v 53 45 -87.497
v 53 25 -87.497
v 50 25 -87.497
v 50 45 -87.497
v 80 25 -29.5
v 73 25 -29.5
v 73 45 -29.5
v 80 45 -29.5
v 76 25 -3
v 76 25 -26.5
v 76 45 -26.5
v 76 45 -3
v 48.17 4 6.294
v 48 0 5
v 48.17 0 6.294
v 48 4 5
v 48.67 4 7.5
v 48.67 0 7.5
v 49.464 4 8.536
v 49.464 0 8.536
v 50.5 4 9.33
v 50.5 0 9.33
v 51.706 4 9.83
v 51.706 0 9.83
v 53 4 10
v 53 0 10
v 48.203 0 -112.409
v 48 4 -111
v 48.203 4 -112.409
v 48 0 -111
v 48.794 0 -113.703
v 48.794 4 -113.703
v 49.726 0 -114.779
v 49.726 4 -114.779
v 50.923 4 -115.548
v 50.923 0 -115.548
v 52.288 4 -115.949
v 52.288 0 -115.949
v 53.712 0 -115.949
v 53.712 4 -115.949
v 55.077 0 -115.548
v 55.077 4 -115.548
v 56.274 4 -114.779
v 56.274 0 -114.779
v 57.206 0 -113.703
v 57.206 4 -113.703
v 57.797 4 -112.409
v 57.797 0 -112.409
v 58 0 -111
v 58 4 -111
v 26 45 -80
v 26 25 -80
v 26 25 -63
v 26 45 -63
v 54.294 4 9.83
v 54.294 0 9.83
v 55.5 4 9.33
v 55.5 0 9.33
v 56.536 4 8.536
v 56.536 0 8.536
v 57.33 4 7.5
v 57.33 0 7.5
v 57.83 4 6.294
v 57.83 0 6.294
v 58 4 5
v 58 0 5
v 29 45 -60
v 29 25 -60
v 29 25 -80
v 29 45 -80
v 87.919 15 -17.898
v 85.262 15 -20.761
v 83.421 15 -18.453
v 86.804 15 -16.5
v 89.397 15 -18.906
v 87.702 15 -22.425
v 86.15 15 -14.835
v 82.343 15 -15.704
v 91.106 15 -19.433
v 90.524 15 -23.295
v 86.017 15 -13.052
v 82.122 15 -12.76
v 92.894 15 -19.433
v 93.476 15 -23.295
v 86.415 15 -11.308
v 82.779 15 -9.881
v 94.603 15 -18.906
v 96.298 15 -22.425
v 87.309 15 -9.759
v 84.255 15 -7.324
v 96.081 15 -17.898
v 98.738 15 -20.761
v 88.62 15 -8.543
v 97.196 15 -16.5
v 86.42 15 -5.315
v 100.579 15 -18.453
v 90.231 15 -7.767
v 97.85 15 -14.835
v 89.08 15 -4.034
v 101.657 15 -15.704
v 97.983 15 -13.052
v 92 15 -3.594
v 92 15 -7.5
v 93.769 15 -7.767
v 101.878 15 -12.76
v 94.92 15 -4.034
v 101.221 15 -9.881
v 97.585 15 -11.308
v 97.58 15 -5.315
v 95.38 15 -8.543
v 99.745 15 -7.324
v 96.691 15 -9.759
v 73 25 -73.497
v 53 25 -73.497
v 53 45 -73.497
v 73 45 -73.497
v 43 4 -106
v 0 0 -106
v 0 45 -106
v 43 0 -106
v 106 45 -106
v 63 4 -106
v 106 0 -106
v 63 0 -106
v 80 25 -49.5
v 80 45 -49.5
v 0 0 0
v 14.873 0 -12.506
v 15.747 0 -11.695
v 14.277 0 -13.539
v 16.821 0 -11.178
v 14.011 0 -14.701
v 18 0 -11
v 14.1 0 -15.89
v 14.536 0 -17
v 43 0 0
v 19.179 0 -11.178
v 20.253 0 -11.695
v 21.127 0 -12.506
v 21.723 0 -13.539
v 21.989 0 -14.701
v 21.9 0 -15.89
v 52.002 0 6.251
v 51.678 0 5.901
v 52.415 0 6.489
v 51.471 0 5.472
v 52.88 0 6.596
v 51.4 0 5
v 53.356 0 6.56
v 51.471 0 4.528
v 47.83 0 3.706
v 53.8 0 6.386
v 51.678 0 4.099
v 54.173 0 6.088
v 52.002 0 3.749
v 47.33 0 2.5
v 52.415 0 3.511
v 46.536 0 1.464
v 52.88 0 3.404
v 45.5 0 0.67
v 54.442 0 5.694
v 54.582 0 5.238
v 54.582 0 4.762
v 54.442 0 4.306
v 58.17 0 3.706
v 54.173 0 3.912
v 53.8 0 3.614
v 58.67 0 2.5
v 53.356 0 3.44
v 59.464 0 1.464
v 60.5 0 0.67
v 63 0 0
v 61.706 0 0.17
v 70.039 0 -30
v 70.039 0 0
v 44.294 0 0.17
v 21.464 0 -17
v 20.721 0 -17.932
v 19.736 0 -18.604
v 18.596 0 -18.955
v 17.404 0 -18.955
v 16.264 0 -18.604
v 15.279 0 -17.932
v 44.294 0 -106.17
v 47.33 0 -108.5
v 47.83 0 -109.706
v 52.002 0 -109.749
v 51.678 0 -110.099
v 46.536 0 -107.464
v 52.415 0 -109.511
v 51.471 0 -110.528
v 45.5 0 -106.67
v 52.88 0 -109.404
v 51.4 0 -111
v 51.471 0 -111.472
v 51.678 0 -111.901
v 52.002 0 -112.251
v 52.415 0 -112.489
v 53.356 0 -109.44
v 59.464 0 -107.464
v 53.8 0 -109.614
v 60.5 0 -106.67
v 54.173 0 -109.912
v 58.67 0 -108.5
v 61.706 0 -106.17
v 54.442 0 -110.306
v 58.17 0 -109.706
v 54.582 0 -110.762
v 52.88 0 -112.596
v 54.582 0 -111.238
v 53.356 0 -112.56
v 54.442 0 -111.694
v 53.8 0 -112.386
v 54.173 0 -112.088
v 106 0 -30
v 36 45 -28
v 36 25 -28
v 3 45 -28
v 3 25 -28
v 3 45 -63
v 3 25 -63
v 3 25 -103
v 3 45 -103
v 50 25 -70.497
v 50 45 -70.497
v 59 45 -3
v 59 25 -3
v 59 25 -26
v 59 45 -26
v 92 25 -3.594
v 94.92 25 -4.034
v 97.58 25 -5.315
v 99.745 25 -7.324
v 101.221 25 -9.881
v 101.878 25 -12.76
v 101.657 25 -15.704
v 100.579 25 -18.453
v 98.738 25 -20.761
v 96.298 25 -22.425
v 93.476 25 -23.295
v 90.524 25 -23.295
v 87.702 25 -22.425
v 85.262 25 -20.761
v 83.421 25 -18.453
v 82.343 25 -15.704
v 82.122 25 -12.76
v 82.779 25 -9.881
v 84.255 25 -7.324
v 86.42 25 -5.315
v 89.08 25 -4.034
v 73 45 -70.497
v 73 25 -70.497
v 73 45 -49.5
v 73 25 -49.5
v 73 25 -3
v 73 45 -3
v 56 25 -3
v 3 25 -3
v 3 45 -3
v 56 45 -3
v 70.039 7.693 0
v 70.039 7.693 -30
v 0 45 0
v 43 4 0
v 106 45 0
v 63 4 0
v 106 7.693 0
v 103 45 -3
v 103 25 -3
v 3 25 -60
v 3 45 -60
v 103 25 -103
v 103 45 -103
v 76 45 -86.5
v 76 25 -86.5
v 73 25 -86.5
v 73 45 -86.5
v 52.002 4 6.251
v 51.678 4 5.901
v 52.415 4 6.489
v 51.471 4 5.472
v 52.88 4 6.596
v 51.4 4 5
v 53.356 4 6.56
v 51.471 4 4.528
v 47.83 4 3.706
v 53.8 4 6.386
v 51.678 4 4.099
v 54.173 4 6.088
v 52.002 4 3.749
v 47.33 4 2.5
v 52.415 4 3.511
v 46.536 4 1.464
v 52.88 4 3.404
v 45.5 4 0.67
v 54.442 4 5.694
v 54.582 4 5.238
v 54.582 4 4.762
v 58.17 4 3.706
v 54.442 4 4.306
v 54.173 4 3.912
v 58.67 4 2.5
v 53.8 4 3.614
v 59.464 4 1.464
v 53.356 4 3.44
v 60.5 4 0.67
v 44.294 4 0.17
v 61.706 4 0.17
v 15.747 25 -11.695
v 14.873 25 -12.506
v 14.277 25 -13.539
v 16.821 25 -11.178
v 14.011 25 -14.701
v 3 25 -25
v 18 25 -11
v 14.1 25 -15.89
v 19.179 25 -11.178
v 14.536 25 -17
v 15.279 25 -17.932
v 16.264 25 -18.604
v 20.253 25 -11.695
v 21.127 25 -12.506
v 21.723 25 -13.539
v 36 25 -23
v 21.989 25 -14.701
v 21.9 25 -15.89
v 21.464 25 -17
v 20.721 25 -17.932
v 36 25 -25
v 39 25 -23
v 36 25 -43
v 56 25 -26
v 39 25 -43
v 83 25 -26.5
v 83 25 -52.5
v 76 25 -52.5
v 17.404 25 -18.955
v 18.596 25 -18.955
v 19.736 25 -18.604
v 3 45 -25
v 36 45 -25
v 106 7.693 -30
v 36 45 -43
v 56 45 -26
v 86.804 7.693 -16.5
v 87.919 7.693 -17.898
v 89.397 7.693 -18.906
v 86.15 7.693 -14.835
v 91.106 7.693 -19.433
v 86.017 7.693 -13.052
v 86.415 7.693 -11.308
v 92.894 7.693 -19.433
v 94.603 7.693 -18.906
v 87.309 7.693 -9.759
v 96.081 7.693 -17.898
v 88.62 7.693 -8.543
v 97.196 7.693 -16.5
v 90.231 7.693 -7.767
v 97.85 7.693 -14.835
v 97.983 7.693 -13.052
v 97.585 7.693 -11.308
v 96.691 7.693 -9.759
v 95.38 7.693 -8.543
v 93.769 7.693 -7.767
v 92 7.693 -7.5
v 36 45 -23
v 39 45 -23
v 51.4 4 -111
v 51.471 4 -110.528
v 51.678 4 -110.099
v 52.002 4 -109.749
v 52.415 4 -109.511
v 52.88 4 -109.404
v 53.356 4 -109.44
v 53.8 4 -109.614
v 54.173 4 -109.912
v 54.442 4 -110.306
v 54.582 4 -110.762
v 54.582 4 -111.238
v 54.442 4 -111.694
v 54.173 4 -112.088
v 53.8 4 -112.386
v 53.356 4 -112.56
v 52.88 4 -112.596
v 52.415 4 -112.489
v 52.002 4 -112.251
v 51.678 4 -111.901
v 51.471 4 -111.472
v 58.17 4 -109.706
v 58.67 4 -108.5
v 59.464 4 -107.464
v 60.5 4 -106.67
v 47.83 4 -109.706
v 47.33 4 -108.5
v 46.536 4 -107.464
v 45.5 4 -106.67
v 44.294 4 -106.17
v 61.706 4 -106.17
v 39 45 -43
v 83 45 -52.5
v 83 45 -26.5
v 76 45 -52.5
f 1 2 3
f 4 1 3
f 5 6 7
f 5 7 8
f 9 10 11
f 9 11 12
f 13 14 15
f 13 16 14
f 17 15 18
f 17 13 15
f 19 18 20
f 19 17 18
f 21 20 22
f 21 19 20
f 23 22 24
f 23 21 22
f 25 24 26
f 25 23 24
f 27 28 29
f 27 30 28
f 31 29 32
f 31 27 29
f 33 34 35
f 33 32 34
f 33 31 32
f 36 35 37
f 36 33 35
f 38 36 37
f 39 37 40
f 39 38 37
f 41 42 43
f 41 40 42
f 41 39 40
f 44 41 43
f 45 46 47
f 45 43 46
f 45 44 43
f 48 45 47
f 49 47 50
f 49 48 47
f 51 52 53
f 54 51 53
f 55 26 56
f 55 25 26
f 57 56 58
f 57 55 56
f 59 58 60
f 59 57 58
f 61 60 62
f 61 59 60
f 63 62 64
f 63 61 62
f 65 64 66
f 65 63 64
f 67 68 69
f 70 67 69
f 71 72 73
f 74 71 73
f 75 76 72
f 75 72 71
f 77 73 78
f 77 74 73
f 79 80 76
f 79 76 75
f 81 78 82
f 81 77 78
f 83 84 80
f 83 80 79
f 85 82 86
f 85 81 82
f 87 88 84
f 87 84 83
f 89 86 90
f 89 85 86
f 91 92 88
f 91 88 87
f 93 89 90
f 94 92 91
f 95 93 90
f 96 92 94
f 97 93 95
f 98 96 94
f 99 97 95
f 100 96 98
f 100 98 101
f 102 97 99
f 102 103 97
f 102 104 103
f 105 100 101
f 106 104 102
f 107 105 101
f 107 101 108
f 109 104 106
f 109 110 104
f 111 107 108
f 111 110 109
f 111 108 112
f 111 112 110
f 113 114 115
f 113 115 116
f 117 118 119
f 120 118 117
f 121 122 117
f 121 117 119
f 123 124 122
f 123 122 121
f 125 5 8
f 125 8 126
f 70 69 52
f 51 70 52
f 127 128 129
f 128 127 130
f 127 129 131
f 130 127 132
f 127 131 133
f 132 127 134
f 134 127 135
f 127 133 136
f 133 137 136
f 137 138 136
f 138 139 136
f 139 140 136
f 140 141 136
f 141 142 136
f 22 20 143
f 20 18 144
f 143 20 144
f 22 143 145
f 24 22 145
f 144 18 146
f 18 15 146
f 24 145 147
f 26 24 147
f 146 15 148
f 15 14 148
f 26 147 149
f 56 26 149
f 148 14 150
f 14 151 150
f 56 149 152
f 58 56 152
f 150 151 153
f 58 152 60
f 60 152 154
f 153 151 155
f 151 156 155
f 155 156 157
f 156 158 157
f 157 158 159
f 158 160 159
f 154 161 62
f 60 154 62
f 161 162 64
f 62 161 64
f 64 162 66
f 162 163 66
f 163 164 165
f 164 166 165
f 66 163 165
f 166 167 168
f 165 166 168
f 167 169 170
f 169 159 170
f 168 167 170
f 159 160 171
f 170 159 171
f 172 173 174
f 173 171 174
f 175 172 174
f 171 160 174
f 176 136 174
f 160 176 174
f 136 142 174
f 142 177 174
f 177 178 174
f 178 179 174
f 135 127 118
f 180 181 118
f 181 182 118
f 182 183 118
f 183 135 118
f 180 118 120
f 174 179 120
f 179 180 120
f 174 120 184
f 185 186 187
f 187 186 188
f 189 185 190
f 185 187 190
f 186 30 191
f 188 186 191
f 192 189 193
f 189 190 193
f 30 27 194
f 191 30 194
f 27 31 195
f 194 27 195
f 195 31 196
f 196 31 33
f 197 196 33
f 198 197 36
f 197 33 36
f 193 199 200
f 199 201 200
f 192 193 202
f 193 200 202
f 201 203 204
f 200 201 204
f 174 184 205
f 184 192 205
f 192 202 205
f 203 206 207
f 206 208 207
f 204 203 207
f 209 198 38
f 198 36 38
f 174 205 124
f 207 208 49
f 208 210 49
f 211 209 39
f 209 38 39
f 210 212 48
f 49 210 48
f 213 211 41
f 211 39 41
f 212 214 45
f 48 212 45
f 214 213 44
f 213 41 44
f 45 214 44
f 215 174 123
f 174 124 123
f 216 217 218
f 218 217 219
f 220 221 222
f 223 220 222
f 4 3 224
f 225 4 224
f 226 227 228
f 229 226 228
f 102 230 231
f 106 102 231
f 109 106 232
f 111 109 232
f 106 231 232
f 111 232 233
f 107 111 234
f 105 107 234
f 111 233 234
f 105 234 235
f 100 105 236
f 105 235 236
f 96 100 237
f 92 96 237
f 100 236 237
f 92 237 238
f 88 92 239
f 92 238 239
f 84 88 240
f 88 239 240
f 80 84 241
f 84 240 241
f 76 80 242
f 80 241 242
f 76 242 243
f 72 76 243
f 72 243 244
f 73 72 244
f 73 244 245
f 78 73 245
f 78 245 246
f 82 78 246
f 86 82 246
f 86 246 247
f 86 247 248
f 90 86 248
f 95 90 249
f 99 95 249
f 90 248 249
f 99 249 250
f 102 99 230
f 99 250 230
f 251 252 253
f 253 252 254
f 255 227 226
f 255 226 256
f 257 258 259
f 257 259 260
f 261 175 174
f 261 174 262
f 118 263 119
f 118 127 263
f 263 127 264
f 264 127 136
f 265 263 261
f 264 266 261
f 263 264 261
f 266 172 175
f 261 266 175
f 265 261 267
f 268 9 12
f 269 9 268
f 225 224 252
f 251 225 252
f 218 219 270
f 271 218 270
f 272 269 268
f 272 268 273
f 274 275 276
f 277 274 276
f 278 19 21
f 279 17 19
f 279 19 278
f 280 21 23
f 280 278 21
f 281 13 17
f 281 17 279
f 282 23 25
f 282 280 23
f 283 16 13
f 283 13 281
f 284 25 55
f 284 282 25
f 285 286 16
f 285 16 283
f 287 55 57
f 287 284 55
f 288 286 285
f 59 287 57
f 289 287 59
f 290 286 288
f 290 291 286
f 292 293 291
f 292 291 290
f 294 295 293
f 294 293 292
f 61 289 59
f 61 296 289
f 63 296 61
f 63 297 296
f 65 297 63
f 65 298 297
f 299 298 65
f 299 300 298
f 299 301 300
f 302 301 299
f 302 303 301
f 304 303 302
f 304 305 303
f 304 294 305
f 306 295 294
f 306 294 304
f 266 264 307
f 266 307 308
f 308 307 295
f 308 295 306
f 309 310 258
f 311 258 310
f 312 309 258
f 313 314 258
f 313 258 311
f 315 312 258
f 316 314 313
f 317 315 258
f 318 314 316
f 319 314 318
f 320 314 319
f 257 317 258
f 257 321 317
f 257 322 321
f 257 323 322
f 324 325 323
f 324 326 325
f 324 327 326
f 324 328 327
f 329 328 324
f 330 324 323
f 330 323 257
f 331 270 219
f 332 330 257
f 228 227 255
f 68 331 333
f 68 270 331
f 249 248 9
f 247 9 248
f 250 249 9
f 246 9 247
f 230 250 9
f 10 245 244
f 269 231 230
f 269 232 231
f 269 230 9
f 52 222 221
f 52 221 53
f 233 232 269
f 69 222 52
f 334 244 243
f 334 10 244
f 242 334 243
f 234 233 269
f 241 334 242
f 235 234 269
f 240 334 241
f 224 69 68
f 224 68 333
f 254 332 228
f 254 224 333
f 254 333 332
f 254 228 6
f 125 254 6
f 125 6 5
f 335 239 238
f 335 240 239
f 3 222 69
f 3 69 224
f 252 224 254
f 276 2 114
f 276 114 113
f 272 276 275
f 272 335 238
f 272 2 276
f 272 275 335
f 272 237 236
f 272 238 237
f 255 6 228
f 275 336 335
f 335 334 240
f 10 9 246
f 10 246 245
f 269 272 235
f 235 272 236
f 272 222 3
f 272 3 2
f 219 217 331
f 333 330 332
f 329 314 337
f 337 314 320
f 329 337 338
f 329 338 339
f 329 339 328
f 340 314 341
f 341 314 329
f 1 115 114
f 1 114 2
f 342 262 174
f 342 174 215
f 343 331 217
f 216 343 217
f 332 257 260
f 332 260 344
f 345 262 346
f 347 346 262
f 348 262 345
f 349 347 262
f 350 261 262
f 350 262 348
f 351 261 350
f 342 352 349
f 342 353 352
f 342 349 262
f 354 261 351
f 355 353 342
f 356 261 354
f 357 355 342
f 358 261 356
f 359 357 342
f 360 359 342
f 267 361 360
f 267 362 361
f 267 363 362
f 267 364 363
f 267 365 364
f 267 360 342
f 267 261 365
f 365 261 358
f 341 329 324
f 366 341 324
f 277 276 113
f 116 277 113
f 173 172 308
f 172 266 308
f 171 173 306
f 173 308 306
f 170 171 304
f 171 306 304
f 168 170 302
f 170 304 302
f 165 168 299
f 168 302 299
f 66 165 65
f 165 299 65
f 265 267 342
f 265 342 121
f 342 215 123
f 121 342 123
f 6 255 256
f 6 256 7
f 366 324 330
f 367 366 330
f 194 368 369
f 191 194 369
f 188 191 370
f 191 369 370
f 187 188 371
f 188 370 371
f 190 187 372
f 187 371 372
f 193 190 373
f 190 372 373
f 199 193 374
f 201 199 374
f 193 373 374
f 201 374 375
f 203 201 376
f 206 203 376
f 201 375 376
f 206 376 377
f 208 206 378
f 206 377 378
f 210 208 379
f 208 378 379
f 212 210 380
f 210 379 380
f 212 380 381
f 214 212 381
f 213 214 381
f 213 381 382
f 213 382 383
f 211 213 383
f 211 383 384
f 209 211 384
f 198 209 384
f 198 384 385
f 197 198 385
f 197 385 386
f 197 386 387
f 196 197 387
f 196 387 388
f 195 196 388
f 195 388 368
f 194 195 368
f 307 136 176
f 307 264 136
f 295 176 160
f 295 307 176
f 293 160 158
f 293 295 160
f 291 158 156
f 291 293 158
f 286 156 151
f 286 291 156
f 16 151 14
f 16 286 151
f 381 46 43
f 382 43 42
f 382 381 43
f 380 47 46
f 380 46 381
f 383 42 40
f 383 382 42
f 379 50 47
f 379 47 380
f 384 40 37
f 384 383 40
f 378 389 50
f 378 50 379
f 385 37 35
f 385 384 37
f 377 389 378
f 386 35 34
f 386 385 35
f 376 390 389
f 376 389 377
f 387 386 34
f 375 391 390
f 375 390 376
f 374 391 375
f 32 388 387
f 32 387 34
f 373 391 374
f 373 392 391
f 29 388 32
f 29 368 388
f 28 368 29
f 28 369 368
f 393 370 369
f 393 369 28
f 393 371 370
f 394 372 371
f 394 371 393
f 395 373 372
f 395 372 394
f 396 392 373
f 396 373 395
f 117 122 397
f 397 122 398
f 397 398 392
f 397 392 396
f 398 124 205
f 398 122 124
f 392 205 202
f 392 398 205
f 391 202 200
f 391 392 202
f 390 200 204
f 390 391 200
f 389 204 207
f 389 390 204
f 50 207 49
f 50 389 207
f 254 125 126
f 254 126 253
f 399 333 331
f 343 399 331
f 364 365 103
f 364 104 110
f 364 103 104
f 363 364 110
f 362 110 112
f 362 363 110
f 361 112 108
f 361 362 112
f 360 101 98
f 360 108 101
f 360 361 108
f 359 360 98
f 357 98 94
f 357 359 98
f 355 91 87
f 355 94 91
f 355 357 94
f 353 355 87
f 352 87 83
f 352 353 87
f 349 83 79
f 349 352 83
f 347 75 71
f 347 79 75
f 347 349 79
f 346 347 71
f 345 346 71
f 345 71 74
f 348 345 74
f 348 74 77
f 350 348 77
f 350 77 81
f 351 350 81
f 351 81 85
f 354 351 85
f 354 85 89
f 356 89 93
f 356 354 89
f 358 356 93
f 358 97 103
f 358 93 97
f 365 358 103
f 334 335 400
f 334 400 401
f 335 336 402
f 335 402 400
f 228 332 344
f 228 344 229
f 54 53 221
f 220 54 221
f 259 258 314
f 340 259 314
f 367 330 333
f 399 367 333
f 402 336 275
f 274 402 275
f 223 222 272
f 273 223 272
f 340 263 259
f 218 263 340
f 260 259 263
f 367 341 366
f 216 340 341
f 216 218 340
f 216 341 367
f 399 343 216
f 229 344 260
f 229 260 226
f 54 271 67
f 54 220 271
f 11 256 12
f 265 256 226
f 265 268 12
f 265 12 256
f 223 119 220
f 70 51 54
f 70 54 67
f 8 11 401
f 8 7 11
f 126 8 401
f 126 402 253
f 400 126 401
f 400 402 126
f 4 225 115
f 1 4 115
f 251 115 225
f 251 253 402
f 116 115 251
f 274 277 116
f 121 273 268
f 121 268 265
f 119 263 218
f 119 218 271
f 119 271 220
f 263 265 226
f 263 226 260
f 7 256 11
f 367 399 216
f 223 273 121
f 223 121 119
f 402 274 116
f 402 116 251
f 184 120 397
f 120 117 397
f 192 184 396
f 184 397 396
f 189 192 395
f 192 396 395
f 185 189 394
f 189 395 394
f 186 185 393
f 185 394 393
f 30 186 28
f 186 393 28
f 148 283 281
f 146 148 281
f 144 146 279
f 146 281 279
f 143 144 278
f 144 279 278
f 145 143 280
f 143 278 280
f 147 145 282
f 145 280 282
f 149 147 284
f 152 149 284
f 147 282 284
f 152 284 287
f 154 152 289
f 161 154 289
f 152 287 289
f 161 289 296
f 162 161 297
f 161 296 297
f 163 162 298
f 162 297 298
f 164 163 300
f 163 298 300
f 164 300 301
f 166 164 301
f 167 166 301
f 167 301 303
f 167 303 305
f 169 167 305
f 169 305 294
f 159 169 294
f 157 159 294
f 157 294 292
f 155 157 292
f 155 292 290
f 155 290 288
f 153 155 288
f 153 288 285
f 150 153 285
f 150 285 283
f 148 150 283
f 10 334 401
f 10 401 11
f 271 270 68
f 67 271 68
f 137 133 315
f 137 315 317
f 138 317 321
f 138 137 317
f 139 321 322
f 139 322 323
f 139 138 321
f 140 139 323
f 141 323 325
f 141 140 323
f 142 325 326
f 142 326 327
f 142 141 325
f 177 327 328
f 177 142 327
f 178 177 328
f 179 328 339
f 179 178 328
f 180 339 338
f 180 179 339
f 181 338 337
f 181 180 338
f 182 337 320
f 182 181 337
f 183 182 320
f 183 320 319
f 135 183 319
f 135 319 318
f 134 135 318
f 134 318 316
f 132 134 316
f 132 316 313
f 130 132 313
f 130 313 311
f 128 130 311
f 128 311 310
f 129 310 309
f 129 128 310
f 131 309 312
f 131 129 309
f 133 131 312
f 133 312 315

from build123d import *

# Parameters (mm, degrees)
SKETCH2_W           = 106
SKETCH2_H           = 106
SKETCH2_R           = 4
SKETCH2_R_2         = 6
BOSS_EXTRUDE1_DEPTH = 25
SKETCH3_W           = 106
SKETCH3_H           = 106
SKETCH3_W_2         = 100
SKETCH3_H_2         = 100
BOSS_EXTRUDE2_DEPTH = 20
SKETCH5_W           = 3
SKETCH5_H           = 23
BOSS_EXTRUDE3_DEPTH = 20
SKETCH7_W           = 20
SKETCH7_H           = 3
BOSS_EXTRUDE4_DEPTH = 20
SKETCH9_R           = 9.905763918
CUT_EXTRUDE1_DEPTH  = 10
SKETCH10_W          = 10
SKETCH10_H          = 4
BOSS_EXTRUDE5_DEPTH = 10
SKETCH11_W          = 10
SKETCH11_H          = 4
BOSS_EXTRUDE6_DEPTH = 10
FILLET2_RADIUS      = 5
FILLET2_LENGTH      = 4
FILLET3_R           = 5
FILLET4_R           = 5
FILLET5_R           = 5
SKETCH13_R          = 1.6
CUT_EXTRUDE2_DEPTH  = 163.397660082
SKETCH14_W          = 35.96051594
SKETCH14_H          = 7.693498276
CUT_EXTRUDE3_DEPTH  = 30


with BuildPart() as part:
    # Sketch2 → Boss-Extrude1 (new body)
    with BuildSketch(Plane(origin=(0, 0, 0), x_dir=(1, 0, 0), z_dir=(0, 1, 0))):
        with Locations((53, 53)):
            Rectangle(SKETCH2_W, SKETCH2_H)
        with Locations(Location((18, 15, 0), (0, 0, 270))):
            Circle(SKETCH2_R, mode=Mode.SUBTRACT)
        with Locations(Location((92, 13.5, 0), (0, 0, 270))):
            Circle(SKETCH2_R_2, mode=Mode.SUBTRACT)
    extrude(amount=BOSS_EXTRUDE1_DEPTH)

    # Sketch3 → Boss-Extrude2 (add)
    with BuildSketch(Plane(origin=(0, 25, 0), x_dir=(1, 0, 0), z_dir=(0, 1, 0))):
        with Locations((53, 53)):
            Rectangle(SKETCH3_W, SKETCH3_H)
        with Locations((53, 53)):
            Rectangle(SKETCH3_W_2, SKETCH3_H_2, mode=Mode.SUBTRACT)
    extrude(amount=BOSS_EXTRUDE2_DEPTH)

    # Sketch5 → Boss-Extrude3 (add)
    with BuildSketch(Plane(origin=(0, 25, 0), x_dir=(1, 0, 0), z_dir=(0, 1, 0))):
        Polygon((3, 28), (3, 25), (36, 25), (36, 23), (39, 23), (39, 43), (36, 43), (36, 28), align=None)
        Polygon((83, 52.5), (83, 26.5), (76, 26.5), (76, 3), (73, 3), (73, 29.5), (80, 29.5), (80, 49.5), (73, 49.5), (73, 52.5), align=None)
        Polygon((3, 63), (3, 60), (29, 60), (29, 80), (26, 80), (26, 63), align=None)
        with Locations((57.5, 14.5)):
            Rectangle(SKETCH5_W, SKETCH5_H)
    extrude(amount=BOSS_EXTRUDE3_DEPTH)

    # Sketch7 → Boss-Extrude4 (add)
    with BuildSketch(Plane(origin=(0, 25, 0), x_dir=(1, 0, 0), z_dir=(0, 1, 0))):
        Polygon((50, 70.496538655), (53, 70.496538655), (53, 73.496538655), (53, 87.496538655), (50, 87.496538655), align=None)
        with Locations((63, 71.996538655)):
            Rectangle(SKETCH7_W, SKETCH7_H)
        Polygon((73, 70.496538655), (73, 52.5), (76, 52.5), (76, 86.5), (73, 86.5), (73, 73.496538655), align=None)
    extrude(amount=BOSS_EXTRUDE4_DEPTH)

    # Sketch9 → Cut-Extrude1 (cut)
    with BuildSketch(Plane(origin=(0, 25, 0), x_dir=(1, 0, 0), z_dir=(0, 1, 0))):
        with Locations(Location((92, 13.5, 0), (0, 0, 270))):
            Circle(SKETCH9_R)
    extrude(amount=-CUT_EXTRUDE1_DEPTH, mode=Mode.SUBTRACT)

    # Sketch10 → Boss-Extrude5 (add)
    with BuildSketch(Plane.XY):
        with Locations((53, 2)):
            Rectangle(SKETCH10_W, SKETCH10_H)
    extrude(amount=BOSS_EXTRUDE5_DEPTH)

    # Sketch11 → Boss-Extrude6 (add)
    with BuildSketch(Plane(origin=(0, 0, -106), x_dir=(-1, 0, 0), z_dir=(0, 0, -1))):
        with Locations((-53, 2)):
            Rectangle(SKETCH11_W, SKETCH11_H)
    extrude(amount=BOSS_EXTRUDE6_DEPTH)

    # Fillet2: full round fillet: the end face becomes a half cylinder, R = half its width
    fillet2_face = Plane((53, 2, -116), x_dir=(0, -1, 0), z_dir=(0, 0, -1))  # on the end face: x along it, z out of the body
    fillet2_slab = fillet2_face.offset(-FILLET2_RADIUS / 2) * Box(FILLET2_LENGTH, 2 * FILLET2_RADIUS, FILLET2_RADIUS, mode=Mode.PRIVATE)  # the body's end, R deep
    fillet2_round = Plane((53, 2, -111), x_dir=(0, 0, -1), z_dir=(0, -1, 0)) * Cylinder(FILLET2_RADIUS, FILLET2_LENGTH, mode=Mode.PRIVATE)  # its axis R under the face
    add(fillet2_slab - fillet2_round, mode=Mode.SUBTRACT)

    # Fillet3
    fillet3_edges = [part.edges().sort_by_distance(p)[0] for p in [
        (48, 2, -106),
        (58, 2, -106),
    ]]
    fillet(fillet3_edges, radius=FILLET3_R - 0.0001)  # a hair under: the kernel refuses the full size

    # Fillet4
    fillet4_edges = [part.edges().sort_by_distance(p)[0] for p in [
        (48, 2, 0),
        (58, 2, 0),
    ]]
    fillet(fillet4_edges, radius=FILLET4_R)

    # Fillet5
    fillet5_edges = [part.edges().sort_by_distance(p)[0] for p in [
        (48, 2, 10),
        (58, 2, 10),
    ]]
    fillet(fillet5_edges, radius=FILLET5_R - 0.0001)  # a hair under: the kernel refuses the full size

    # Sketch13 → Cut-Extrude2 (cut, through all)
    with BuildSketch(Plane(origin=(0, 4, 0), x_dir=(1, 0, 0), z_dir=(0, 1, 0))):
        with Locations(Location((53, -5, 0), (0, 0, 180))):
            Circle(SKETCH13_R)
        with Locations(Location((53, 111, 0), (0, 0, 180))):
            Circle(SKETCH13_R)
    extrude(amount=-CUT_EXTRUDE2_DEPTH, mode=Mode.SUBTRACT)

    # Sketch14 → Cut-Extrude3 (cut)
    with BuildSketch(Plane.XY):
        with Locations((88.01974203, 3.846749138)):
            Rectangle(SKETCH14_W, SKETCH14_H)
    extrude(amount=-CUT_EXTRUDE3_DEPTH, mode=Mode.SUBTRACT)


solid = part.part
